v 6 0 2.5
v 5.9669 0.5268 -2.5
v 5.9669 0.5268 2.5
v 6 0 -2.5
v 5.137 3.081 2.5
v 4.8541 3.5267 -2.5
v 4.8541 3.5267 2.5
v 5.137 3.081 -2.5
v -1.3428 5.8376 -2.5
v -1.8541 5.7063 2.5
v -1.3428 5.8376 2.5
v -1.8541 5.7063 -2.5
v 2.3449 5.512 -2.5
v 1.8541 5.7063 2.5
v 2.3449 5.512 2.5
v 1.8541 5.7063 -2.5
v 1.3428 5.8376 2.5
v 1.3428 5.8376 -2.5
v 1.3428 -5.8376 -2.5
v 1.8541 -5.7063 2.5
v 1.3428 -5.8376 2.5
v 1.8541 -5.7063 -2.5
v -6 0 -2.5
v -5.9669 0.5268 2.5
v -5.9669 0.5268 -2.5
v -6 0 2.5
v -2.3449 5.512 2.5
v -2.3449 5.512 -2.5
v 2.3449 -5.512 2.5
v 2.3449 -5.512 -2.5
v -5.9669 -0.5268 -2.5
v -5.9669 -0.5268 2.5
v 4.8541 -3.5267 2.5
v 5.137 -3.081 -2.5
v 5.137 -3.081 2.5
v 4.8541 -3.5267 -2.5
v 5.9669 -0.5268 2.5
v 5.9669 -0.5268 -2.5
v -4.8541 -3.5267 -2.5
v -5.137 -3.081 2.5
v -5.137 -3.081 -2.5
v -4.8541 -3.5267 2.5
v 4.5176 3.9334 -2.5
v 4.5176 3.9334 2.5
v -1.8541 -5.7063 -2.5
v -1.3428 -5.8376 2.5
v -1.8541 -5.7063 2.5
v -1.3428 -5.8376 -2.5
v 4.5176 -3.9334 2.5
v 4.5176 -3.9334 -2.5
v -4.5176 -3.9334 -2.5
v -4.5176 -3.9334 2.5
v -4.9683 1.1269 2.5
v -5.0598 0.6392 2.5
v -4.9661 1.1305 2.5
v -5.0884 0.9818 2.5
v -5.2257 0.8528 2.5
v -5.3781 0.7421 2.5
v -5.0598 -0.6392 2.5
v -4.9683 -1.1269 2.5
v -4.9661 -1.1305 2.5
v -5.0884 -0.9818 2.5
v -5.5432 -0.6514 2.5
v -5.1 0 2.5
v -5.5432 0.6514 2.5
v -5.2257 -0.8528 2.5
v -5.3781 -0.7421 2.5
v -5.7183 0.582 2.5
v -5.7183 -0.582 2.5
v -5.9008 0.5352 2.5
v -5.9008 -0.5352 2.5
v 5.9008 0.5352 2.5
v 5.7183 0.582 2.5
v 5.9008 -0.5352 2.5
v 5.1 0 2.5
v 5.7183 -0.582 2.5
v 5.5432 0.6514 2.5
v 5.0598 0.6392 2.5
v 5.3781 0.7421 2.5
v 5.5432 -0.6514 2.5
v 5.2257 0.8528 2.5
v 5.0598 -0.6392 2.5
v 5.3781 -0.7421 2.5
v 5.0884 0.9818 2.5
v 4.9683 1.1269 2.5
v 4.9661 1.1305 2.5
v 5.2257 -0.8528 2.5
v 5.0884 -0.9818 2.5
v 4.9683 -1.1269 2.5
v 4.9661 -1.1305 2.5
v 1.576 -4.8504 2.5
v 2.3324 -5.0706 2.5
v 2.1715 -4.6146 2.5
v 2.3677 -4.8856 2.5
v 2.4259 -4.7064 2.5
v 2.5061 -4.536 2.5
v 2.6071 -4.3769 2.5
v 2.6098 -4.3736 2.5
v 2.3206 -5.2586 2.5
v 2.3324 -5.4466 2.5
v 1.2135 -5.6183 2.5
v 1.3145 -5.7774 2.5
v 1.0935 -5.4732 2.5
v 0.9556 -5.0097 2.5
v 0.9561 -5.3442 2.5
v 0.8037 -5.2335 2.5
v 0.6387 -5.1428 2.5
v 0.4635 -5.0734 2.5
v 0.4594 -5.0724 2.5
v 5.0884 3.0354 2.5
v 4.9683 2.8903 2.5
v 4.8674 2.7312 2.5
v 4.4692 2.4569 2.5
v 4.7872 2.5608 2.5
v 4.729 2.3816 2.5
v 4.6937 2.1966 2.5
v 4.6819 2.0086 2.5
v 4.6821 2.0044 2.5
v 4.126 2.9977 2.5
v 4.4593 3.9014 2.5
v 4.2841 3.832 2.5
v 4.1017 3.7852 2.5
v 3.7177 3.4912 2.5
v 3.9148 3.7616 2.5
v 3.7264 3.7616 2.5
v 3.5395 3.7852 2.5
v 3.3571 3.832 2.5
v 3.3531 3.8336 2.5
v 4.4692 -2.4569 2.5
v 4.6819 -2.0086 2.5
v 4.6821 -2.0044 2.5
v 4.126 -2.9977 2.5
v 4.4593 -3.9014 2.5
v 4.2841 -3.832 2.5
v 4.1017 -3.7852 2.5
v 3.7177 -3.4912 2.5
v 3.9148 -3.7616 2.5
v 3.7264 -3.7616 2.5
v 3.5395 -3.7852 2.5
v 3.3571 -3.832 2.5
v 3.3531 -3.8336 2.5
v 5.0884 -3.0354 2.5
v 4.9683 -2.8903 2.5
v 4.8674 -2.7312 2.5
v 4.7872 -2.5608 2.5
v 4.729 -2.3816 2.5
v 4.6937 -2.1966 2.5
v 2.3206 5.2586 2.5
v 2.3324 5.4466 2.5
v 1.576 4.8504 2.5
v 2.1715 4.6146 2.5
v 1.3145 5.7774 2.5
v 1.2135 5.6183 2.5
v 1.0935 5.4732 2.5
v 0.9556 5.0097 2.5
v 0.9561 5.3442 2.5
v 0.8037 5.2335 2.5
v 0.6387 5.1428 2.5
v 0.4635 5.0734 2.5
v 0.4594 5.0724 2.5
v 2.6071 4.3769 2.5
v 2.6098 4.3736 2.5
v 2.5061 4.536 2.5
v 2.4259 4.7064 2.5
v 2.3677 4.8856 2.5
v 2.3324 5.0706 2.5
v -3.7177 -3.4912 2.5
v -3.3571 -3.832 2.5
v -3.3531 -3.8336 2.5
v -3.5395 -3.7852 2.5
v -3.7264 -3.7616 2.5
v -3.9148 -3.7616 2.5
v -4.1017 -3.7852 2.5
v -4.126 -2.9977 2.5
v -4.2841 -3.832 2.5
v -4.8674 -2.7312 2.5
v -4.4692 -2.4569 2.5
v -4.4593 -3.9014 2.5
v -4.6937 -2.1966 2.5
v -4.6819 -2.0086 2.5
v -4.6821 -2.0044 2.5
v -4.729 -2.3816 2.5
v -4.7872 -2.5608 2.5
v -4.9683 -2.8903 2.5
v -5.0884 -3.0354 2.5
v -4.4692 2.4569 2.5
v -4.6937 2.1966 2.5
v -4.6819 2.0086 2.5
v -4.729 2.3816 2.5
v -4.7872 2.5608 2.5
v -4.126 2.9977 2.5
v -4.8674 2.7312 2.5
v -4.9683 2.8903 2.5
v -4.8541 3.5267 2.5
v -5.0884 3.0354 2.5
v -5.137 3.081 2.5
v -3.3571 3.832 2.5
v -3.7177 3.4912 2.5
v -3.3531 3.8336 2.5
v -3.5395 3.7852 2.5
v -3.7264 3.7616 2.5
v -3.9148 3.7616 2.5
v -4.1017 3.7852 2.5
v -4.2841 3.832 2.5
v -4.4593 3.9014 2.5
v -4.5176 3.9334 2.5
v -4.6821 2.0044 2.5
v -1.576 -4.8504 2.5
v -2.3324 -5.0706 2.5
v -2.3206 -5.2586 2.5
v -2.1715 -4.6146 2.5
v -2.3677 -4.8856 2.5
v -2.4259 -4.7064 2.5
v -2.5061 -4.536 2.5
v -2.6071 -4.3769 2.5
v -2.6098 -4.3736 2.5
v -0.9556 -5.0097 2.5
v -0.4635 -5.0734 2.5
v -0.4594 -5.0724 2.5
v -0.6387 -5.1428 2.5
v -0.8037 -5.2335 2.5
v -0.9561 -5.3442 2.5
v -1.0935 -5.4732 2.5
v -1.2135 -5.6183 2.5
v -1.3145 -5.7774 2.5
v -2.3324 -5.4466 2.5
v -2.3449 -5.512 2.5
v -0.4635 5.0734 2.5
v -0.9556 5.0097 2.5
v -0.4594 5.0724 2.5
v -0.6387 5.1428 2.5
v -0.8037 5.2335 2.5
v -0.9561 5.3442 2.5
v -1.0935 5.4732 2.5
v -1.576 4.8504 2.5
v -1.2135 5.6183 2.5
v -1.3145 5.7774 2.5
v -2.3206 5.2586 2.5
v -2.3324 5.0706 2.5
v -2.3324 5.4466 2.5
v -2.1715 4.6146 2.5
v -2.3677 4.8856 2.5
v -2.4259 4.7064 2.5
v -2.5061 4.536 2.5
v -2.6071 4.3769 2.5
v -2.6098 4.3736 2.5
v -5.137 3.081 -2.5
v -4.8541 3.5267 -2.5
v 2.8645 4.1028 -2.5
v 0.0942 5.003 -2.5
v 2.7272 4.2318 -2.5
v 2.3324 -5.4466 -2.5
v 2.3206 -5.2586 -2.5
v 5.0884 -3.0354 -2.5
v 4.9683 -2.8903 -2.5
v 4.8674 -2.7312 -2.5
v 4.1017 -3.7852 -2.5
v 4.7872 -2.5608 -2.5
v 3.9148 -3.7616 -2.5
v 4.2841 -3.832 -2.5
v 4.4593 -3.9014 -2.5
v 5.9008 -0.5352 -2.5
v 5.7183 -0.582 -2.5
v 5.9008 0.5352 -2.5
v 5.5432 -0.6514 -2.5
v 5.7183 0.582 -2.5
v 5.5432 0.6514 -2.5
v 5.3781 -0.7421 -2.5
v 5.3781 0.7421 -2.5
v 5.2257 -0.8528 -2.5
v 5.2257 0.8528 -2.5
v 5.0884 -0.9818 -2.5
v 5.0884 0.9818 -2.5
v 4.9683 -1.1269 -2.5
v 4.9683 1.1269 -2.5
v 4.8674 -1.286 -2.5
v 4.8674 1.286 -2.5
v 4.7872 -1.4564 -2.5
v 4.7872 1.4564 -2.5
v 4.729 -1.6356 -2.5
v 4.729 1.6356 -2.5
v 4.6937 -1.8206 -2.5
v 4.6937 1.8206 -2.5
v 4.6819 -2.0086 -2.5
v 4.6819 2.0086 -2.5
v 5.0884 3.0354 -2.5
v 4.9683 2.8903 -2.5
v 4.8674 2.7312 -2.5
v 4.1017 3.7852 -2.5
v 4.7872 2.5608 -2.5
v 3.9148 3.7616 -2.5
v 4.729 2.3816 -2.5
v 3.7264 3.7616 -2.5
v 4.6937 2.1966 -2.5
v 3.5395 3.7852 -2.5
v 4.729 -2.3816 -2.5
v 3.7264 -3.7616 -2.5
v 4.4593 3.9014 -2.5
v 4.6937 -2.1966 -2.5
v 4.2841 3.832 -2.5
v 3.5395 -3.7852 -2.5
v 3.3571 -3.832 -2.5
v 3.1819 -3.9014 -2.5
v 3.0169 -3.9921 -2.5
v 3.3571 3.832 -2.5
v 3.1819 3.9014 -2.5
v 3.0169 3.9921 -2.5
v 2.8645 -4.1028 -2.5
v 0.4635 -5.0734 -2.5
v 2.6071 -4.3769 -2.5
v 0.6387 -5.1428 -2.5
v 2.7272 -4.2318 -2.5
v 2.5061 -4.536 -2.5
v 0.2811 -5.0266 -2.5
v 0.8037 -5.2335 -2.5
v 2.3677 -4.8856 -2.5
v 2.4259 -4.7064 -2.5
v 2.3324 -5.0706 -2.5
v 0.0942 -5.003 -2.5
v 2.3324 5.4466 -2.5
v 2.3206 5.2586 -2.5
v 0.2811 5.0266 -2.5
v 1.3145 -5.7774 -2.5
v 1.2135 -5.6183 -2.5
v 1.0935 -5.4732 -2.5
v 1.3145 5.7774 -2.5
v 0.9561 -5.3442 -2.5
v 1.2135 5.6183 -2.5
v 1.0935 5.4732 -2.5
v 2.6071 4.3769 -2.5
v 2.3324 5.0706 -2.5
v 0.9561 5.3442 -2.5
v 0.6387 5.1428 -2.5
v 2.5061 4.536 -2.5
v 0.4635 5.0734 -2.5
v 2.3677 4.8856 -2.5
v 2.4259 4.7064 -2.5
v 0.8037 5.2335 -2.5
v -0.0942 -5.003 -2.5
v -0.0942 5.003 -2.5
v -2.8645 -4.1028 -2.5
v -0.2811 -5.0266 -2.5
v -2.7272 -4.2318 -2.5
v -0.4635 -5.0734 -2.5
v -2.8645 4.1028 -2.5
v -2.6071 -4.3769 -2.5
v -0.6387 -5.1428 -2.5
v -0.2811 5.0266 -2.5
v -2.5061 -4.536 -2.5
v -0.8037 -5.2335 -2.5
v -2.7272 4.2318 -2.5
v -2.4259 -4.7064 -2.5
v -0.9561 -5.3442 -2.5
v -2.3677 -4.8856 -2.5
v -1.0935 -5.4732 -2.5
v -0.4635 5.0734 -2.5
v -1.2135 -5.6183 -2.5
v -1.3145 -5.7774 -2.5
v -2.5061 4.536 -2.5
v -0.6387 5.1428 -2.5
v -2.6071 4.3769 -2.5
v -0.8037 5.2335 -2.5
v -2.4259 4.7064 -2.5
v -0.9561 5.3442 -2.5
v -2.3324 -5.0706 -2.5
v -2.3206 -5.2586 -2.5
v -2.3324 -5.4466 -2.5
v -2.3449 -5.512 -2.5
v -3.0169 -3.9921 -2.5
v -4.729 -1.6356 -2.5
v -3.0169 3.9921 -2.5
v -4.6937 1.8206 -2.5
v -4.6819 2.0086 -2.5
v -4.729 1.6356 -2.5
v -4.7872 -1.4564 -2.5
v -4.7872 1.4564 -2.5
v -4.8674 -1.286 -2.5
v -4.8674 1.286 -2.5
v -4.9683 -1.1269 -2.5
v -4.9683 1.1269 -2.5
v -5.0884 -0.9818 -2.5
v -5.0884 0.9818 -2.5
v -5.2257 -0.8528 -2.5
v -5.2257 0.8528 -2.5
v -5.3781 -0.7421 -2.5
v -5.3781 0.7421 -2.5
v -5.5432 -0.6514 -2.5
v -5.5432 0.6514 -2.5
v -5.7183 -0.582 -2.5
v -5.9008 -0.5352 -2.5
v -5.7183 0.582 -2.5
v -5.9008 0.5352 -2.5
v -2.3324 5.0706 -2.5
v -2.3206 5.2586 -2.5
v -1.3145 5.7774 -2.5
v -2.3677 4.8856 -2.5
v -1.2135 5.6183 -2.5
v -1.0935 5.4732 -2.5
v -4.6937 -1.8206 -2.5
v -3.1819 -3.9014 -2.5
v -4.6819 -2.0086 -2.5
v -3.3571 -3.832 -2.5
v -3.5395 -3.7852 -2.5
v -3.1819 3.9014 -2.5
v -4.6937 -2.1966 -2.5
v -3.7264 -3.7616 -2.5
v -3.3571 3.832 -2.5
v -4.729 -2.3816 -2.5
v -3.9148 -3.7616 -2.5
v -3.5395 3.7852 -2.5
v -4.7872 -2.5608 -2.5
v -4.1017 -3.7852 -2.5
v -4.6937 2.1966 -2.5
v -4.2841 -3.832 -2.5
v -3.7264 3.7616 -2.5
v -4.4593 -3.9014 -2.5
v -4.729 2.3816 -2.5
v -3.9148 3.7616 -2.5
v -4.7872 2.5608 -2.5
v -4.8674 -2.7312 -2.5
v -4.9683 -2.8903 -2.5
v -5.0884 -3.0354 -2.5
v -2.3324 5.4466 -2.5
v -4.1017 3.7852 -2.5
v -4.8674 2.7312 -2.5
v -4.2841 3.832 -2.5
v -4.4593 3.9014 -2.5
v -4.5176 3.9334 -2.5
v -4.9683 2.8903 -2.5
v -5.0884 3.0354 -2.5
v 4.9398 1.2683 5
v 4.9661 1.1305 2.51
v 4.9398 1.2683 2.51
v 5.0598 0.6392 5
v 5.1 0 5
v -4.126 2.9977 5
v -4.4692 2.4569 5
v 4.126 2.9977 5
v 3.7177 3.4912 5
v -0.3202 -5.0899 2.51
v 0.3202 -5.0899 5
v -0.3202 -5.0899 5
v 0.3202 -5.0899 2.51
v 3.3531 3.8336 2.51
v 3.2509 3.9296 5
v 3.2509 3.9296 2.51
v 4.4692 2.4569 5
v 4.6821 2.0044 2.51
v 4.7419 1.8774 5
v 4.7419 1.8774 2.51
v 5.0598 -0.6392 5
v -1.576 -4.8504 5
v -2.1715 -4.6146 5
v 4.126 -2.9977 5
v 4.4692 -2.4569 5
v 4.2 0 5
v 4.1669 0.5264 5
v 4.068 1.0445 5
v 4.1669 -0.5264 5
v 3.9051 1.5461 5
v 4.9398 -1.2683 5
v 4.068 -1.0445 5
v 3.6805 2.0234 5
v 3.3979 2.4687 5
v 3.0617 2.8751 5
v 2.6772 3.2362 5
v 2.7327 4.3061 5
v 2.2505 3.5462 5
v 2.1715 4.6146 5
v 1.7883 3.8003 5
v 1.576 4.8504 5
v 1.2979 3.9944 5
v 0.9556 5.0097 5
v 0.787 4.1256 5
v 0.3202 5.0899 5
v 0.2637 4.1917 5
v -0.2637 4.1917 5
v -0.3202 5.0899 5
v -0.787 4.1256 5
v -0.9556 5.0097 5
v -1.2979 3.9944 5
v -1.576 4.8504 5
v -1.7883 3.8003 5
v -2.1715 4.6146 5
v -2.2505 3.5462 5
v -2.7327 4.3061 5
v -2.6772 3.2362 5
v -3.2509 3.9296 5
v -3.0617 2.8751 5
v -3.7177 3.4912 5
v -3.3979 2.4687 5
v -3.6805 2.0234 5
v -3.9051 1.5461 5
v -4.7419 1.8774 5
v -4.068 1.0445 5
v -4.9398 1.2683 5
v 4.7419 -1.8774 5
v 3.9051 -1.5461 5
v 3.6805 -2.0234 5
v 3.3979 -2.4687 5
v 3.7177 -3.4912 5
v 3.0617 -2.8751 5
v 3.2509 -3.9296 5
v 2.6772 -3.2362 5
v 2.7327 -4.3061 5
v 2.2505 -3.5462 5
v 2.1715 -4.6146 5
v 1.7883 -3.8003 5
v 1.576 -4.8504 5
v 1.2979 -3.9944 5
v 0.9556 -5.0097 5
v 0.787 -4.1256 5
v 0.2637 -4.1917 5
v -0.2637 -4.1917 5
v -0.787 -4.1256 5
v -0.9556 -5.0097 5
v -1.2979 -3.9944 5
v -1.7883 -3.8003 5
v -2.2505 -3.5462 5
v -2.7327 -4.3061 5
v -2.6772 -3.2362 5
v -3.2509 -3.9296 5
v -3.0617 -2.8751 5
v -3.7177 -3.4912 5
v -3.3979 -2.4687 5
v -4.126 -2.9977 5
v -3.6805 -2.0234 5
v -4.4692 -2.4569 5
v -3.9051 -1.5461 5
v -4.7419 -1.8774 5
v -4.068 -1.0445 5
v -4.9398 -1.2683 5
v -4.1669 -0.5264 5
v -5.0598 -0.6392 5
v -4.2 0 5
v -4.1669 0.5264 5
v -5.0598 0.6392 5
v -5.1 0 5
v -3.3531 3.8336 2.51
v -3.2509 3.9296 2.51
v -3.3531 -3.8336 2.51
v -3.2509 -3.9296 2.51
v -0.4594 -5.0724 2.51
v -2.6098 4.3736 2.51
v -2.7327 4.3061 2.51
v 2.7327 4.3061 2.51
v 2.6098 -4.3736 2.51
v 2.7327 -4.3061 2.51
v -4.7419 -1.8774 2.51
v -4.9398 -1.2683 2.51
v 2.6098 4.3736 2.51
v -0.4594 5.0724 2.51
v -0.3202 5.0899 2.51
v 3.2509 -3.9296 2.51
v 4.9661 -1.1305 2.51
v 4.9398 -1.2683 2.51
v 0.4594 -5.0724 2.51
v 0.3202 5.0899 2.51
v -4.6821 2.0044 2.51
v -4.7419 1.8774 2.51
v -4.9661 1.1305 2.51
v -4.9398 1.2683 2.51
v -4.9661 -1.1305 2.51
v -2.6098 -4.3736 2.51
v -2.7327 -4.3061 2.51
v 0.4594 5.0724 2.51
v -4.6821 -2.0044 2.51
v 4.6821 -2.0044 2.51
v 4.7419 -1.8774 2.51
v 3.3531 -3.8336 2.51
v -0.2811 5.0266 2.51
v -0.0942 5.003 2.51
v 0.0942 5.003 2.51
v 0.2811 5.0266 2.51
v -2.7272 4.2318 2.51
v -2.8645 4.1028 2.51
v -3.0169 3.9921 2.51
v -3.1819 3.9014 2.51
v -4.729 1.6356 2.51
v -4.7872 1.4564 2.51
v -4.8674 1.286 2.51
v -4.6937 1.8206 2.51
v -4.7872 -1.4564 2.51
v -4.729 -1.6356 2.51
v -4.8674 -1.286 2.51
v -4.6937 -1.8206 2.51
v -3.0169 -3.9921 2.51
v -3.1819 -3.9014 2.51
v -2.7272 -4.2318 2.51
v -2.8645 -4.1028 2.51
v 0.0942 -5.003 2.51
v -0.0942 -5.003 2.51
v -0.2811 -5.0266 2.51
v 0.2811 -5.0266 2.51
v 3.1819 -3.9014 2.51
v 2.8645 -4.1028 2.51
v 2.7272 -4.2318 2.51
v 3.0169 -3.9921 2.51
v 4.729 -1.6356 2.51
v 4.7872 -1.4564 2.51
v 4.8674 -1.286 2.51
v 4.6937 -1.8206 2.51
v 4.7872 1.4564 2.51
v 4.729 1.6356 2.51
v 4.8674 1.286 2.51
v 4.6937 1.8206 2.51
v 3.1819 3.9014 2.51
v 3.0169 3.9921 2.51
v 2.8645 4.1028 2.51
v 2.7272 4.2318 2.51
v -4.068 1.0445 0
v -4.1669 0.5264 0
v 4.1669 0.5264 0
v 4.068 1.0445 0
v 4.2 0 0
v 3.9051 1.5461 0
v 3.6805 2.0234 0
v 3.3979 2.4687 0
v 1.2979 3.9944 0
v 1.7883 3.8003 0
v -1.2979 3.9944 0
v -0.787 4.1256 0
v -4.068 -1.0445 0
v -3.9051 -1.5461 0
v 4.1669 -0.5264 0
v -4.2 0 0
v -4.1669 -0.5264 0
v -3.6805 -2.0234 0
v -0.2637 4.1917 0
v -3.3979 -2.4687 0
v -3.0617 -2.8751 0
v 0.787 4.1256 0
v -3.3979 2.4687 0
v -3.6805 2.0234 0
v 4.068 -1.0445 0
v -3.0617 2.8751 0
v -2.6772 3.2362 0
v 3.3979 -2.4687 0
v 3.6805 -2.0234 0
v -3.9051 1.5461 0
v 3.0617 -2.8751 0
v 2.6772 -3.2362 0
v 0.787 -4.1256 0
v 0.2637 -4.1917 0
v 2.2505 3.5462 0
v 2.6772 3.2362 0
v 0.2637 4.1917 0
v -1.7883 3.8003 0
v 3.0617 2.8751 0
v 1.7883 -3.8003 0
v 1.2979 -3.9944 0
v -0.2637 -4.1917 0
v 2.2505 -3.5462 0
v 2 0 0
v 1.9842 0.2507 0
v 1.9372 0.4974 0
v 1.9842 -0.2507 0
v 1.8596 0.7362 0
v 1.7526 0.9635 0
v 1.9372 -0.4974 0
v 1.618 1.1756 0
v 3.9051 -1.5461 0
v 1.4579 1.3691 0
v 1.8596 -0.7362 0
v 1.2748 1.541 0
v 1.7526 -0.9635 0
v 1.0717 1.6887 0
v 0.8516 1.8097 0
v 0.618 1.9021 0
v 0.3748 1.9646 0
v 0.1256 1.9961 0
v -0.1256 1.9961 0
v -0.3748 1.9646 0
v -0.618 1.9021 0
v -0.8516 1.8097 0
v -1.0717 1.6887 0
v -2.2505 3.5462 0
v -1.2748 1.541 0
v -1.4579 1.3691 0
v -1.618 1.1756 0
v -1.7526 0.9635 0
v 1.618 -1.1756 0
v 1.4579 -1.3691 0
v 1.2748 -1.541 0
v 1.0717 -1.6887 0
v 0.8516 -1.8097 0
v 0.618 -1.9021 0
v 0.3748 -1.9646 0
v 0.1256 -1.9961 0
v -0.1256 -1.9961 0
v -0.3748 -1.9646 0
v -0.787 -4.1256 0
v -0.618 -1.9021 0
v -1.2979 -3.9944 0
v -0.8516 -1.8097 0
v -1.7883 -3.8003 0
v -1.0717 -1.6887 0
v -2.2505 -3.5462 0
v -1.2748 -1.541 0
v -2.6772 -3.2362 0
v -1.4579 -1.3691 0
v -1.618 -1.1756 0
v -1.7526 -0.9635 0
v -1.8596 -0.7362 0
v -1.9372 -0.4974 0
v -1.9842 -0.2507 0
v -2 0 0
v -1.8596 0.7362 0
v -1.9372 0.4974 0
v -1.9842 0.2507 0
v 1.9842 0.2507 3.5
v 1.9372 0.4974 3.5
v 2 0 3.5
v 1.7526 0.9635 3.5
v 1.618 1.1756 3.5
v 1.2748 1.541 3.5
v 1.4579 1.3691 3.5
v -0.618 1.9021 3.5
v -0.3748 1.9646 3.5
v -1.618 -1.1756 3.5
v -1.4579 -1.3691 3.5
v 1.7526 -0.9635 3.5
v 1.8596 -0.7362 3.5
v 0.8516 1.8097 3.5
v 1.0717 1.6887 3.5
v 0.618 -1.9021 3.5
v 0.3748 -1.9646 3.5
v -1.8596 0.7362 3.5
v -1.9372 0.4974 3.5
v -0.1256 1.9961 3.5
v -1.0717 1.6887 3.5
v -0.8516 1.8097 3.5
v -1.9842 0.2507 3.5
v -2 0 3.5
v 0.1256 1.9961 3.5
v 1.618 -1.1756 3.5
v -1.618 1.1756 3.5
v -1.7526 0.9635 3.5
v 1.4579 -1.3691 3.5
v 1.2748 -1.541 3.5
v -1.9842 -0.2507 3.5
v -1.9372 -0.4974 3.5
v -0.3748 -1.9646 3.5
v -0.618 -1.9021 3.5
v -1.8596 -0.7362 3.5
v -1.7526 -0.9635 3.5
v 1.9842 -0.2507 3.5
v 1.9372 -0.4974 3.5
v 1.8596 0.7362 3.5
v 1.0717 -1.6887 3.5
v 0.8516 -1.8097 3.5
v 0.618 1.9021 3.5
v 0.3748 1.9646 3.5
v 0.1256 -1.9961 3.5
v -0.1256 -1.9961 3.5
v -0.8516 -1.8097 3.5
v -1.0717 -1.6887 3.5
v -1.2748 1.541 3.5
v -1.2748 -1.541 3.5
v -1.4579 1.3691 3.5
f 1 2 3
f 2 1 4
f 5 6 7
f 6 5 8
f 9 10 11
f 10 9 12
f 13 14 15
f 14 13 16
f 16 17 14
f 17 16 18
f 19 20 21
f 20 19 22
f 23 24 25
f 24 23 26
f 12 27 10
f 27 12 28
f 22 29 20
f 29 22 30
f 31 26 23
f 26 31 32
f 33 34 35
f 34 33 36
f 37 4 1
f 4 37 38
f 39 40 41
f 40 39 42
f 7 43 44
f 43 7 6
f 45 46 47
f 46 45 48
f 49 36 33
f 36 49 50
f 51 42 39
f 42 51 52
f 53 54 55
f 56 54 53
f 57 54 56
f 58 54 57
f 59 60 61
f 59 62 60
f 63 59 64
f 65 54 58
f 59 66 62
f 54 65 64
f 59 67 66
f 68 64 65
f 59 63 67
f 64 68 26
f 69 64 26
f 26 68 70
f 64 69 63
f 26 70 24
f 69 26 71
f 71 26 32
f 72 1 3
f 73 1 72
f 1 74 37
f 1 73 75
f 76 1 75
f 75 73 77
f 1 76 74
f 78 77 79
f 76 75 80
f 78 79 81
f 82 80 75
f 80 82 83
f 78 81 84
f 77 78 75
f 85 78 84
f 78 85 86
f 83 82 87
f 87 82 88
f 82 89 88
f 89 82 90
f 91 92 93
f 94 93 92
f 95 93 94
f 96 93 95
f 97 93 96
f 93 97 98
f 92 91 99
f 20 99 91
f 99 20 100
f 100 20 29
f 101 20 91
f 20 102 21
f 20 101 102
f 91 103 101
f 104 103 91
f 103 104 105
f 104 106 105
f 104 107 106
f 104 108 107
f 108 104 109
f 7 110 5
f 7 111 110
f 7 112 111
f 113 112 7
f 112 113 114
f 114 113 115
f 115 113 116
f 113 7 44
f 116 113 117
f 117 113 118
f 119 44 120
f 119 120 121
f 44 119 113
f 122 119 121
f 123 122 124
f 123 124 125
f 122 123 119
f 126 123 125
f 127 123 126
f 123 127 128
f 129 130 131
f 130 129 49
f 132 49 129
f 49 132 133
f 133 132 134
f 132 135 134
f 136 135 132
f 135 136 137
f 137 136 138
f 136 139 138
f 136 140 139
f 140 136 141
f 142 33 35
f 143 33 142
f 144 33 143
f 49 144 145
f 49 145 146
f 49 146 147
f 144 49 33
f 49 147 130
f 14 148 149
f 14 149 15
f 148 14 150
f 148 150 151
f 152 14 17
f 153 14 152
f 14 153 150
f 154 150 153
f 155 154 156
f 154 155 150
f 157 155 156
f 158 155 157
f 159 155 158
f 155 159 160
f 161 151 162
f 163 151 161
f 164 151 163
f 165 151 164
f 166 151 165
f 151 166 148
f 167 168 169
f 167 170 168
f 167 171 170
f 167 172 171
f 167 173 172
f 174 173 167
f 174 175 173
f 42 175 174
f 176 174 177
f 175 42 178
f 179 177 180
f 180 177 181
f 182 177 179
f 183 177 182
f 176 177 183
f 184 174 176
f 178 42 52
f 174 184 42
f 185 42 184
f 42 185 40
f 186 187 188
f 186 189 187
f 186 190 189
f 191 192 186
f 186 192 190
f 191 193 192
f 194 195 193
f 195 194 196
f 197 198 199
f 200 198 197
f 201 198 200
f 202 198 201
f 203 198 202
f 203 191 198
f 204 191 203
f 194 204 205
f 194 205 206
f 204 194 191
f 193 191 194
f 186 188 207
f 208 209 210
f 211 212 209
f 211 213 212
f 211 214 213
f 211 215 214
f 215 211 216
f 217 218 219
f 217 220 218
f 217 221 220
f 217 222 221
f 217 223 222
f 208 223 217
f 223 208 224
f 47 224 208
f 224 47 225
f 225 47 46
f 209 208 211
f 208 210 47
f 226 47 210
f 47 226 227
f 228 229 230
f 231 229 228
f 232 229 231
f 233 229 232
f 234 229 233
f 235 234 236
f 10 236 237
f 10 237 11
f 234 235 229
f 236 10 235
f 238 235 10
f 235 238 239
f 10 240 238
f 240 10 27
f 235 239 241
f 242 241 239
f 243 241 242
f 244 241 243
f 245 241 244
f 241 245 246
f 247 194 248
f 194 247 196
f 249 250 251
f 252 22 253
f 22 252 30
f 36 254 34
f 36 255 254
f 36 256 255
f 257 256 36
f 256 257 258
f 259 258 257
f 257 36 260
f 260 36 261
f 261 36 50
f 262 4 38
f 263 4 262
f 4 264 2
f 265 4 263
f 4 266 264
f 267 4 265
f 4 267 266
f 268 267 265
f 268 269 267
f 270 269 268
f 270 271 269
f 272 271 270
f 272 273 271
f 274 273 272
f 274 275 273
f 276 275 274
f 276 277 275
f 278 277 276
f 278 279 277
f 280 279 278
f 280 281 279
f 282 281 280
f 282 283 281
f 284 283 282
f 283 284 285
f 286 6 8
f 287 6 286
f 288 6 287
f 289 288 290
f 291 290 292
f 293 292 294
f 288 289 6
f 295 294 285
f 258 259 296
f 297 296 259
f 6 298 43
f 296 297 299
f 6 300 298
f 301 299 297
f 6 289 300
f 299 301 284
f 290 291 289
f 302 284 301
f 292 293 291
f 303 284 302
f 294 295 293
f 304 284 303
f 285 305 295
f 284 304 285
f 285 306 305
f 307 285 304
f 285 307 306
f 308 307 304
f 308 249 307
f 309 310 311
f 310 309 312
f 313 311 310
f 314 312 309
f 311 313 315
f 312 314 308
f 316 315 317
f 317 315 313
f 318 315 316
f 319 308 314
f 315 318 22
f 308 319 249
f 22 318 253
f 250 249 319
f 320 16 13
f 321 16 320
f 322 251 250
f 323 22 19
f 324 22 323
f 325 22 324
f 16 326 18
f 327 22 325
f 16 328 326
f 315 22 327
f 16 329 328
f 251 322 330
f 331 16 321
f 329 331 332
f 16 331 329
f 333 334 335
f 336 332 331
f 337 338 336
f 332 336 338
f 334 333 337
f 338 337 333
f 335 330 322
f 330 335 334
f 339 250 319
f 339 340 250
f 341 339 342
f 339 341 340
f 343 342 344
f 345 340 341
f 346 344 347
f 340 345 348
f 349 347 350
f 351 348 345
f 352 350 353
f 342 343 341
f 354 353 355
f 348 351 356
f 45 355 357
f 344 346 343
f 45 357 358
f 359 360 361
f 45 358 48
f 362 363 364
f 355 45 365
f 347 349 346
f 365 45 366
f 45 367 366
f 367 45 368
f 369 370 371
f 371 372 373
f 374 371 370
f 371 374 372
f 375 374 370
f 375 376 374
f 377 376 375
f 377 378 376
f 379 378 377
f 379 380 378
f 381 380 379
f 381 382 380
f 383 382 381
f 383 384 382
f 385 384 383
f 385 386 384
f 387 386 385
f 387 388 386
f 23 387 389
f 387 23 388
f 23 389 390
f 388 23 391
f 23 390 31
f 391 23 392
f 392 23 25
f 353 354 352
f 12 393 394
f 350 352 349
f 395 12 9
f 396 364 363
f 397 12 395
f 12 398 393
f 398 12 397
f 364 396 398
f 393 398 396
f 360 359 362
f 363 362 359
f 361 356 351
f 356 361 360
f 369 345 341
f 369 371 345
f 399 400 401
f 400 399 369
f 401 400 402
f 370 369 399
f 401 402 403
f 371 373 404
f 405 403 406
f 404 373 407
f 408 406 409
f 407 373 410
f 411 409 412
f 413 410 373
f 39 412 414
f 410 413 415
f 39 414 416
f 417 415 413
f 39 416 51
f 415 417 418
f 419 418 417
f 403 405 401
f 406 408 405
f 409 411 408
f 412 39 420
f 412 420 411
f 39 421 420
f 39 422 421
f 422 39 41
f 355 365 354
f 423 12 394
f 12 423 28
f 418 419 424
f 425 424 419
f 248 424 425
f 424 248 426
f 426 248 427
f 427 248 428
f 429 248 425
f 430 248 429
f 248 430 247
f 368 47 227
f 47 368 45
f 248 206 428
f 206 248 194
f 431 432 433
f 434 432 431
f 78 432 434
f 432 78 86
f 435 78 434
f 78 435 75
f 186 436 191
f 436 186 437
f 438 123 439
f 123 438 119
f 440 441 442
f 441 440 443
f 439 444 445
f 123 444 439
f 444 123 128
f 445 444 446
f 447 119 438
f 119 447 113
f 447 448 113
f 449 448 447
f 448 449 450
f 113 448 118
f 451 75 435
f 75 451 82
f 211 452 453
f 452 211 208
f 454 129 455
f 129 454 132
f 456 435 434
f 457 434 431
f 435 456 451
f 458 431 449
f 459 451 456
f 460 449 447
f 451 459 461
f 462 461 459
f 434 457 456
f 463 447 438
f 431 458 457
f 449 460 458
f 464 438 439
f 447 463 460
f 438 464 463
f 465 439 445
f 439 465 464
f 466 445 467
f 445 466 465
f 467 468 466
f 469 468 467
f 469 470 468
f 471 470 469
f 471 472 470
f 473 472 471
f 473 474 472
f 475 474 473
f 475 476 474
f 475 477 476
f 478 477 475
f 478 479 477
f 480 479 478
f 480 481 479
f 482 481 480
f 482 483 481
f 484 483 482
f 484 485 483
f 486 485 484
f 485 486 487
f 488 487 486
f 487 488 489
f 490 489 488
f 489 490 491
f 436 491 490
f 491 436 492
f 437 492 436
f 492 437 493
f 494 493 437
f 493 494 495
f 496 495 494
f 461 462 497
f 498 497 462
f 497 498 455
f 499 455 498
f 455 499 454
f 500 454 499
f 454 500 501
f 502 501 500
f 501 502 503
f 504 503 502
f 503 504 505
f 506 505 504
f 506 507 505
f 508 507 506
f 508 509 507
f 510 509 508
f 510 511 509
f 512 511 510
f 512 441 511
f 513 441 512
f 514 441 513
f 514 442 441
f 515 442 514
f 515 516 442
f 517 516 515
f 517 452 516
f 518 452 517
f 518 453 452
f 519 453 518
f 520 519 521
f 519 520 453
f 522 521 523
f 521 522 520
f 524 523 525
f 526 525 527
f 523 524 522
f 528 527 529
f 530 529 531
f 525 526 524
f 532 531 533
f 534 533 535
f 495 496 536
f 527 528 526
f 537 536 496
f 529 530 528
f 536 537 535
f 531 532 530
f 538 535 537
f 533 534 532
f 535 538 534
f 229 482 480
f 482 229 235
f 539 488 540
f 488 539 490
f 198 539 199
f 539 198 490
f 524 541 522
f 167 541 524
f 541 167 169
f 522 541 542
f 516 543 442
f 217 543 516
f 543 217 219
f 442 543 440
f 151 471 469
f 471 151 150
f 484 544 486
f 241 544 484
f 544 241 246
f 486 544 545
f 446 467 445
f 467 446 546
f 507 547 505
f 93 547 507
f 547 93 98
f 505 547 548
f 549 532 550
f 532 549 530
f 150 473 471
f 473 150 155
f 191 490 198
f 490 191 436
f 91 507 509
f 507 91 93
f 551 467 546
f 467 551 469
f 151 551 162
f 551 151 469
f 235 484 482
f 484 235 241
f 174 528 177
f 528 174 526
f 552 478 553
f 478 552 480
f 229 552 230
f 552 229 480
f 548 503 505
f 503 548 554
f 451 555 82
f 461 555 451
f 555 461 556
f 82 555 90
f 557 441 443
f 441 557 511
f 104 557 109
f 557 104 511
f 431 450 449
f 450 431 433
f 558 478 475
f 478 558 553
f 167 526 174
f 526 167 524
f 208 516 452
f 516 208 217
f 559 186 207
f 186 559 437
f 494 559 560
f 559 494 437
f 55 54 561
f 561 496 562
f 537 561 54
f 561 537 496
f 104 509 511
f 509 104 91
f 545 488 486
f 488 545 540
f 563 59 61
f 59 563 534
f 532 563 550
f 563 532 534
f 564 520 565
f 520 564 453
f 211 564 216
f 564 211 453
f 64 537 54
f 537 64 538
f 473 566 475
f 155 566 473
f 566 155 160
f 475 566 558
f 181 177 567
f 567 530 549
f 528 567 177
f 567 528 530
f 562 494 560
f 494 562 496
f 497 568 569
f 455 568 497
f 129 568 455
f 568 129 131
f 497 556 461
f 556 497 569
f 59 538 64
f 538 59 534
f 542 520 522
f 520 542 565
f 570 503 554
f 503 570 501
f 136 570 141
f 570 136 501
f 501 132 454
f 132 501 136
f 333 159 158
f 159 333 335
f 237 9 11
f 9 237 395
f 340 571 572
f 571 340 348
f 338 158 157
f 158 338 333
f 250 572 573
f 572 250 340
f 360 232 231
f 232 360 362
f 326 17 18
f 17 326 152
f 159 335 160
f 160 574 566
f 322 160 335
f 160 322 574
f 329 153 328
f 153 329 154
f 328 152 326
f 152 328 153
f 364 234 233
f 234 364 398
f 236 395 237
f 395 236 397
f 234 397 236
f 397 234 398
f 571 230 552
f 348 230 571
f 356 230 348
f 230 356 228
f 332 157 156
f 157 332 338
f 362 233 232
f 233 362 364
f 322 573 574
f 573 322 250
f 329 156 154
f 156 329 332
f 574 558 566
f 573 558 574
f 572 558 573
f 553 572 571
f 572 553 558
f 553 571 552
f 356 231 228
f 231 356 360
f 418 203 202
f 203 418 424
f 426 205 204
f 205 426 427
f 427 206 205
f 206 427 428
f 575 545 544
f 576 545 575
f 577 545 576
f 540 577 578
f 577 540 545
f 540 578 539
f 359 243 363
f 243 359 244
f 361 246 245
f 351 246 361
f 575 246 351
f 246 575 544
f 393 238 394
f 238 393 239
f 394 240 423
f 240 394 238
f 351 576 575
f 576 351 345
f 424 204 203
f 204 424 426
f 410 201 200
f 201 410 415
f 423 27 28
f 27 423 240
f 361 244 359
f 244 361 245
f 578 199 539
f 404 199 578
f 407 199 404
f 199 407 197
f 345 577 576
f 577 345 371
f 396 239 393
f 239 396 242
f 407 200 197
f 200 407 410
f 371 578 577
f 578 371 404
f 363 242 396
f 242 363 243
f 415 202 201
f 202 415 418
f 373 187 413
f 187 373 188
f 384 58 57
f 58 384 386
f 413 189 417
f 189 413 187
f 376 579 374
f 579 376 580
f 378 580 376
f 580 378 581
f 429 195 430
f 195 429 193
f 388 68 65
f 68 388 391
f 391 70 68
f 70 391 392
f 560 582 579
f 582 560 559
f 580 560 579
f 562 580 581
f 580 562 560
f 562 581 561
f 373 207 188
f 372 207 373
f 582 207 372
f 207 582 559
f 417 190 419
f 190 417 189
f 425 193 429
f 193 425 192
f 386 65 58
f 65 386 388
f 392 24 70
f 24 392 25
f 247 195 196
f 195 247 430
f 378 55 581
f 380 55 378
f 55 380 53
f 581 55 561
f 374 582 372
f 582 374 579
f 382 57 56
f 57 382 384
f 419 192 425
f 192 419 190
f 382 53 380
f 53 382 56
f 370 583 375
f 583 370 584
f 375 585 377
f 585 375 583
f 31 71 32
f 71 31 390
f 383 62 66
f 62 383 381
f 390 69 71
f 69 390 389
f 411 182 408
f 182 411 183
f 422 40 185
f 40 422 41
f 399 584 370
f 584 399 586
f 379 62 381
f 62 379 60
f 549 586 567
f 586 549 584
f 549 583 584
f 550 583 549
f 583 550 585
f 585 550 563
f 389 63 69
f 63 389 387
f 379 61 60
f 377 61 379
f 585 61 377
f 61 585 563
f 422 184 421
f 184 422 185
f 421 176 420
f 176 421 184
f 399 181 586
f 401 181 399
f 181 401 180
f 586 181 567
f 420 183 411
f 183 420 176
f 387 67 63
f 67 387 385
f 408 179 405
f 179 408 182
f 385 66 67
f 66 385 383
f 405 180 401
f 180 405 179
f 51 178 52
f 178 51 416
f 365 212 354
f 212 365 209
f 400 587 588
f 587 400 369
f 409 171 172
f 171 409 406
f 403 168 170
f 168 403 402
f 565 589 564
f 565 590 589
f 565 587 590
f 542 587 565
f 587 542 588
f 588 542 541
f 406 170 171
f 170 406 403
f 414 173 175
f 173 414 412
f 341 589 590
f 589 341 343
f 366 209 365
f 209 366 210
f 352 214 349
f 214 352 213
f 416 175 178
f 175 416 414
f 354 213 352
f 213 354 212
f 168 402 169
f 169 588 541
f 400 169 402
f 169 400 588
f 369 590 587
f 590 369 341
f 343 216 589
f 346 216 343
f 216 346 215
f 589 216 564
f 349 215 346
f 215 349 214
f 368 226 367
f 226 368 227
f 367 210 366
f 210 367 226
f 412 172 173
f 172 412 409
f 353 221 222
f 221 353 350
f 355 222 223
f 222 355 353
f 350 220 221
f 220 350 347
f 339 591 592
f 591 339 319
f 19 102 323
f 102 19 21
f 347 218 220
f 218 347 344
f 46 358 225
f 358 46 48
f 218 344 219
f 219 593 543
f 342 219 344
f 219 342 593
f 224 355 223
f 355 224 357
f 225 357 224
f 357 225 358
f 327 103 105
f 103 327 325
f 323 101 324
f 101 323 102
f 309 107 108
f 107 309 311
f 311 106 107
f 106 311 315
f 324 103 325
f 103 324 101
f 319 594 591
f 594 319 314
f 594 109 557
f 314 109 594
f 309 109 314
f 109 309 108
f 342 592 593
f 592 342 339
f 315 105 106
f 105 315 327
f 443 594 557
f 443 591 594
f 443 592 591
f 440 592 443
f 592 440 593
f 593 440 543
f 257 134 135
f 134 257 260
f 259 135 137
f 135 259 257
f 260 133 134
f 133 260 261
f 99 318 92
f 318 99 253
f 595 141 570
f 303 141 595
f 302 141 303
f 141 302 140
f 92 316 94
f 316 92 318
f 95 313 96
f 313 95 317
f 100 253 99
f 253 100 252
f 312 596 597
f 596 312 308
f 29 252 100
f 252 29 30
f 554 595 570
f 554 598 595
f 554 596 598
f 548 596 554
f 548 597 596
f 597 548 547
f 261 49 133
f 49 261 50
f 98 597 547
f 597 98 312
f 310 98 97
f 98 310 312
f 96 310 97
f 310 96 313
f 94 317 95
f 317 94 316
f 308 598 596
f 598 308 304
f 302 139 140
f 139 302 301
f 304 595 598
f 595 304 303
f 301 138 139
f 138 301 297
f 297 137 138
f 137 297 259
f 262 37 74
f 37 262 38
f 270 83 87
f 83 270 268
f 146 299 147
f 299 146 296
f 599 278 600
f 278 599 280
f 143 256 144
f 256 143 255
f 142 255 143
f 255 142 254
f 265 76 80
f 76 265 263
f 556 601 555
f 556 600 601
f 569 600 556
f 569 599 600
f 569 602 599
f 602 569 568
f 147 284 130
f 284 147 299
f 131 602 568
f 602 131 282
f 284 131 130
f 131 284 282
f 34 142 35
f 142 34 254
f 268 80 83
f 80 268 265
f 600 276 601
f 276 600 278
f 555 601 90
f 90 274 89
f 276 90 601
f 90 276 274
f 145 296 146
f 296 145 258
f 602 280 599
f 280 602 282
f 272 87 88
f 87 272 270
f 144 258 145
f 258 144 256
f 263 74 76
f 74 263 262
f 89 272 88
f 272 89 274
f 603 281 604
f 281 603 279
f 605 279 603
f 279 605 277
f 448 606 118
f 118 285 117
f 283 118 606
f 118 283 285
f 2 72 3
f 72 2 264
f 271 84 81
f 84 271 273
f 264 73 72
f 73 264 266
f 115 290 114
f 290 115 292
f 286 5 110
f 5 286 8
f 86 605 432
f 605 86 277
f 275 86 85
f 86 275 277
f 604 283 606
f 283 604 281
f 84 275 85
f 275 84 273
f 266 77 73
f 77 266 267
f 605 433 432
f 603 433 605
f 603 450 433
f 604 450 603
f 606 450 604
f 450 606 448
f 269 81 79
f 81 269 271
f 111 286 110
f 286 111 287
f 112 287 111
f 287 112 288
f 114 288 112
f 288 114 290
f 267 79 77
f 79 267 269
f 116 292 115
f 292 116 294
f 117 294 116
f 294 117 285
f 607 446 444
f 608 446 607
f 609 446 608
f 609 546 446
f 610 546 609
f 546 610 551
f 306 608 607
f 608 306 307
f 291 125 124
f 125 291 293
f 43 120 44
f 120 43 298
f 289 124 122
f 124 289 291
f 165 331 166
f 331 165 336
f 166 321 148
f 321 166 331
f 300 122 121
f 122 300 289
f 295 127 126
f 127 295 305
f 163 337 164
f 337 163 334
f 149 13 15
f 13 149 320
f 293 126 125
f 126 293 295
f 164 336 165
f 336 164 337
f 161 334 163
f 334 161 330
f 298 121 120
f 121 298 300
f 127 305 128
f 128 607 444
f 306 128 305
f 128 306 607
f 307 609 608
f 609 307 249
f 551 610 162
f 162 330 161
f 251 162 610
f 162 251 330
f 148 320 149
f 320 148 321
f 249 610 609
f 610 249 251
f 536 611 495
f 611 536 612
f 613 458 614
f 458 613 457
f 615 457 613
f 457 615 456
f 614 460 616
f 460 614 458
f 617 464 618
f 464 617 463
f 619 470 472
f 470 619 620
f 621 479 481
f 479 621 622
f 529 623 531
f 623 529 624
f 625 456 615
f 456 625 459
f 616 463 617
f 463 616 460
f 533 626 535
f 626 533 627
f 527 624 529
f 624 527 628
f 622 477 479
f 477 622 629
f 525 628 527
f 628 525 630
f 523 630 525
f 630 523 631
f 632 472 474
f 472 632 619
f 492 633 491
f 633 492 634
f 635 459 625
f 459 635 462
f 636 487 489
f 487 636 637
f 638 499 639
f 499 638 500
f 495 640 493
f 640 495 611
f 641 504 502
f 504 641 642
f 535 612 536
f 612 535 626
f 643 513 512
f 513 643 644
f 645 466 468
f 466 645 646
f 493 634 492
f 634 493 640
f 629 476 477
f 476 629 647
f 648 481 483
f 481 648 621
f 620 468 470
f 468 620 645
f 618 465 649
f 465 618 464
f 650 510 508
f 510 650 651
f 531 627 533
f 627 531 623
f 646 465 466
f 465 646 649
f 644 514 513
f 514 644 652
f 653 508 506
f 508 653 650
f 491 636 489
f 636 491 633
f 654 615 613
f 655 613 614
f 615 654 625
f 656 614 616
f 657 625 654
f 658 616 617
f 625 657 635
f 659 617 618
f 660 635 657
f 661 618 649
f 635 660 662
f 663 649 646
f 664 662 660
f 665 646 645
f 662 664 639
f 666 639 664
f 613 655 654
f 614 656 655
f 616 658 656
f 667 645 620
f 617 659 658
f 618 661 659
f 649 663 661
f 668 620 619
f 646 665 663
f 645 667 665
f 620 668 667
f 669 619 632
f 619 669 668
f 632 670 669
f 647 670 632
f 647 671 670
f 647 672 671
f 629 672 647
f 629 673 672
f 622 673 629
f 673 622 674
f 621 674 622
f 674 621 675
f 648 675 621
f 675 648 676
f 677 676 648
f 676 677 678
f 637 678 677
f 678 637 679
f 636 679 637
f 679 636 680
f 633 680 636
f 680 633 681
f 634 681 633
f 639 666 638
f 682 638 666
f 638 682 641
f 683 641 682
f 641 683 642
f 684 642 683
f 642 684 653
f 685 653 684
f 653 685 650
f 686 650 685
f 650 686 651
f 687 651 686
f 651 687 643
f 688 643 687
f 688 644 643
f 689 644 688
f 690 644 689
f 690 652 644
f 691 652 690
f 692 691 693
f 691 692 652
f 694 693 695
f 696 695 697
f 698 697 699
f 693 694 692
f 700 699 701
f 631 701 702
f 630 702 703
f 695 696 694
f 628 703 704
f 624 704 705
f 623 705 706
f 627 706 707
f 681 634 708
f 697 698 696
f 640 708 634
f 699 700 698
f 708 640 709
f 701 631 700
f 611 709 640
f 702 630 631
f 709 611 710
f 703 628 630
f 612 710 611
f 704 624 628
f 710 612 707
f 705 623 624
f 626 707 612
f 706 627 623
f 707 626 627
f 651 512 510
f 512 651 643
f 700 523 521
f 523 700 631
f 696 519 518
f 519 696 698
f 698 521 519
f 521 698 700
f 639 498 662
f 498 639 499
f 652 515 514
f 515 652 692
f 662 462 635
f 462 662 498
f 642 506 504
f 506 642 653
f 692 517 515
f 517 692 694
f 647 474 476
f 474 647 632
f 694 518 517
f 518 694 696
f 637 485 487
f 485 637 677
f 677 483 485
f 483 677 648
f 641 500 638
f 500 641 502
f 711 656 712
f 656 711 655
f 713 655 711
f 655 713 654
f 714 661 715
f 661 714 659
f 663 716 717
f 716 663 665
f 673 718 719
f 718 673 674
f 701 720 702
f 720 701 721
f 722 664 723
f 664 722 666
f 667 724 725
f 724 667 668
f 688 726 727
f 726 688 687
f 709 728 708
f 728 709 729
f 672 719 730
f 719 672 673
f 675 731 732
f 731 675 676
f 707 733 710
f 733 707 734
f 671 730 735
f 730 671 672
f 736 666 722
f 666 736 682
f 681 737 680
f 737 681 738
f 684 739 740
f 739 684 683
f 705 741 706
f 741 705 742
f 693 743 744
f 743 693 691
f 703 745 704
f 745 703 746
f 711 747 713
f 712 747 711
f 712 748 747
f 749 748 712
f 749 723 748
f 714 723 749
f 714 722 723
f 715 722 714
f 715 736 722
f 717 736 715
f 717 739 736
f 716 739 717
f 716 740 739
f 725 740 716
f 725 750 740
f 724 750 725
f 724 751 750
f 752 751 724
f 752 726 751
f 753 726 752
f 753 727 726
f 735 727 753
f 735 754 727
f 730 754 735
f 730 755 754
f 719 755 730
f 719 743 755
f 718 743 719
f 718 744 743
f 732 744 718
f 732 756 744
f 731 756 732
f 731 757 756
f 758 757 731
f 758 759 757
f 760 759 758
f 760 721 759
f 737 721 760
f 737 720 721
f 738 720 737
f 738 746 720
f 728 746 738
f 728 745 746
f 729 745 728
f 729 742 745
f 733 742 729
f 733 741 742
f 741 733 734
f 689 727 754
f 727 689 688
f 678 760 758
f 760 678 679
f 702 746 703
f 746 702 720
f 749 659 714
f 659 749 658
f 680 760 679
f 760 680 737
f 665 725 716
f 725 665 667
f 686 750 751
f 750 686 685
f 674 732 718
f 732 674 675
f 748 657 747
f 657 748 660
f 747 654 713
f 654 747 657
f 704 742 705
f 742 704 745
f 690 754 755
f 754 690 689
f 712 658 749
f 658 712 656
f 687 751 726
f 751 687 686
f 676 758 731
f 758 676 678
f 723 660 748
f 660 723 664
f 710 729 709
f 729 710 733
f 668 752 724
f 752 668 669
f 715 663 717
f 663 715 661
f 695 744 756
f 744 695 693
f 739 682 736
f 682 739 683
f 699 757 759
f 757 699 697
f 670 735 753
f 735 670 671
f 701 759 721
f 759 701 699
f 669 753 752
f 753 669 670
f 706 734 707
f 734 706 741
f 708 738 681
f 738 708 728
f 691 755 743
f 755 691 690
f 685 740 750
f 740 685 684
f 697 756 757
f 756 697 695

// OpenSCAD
$fn=50;
union() 
{
	difference() 
	{
		union() 
		{
			cylinder(h = 5, r = 6, center=true);
			translate([0,0,2.5]) cylinder(h=5, r=5.1, center=true);
		}

		translate ([0,0,2.5]) cylinder(h=5, r=4.2, center=true);

		for ( i = [0:36:359] ) rotate ([0,0,i])
		{
			translate([0, 6.5, -2.5])
				#cylinder(h=5.01, r = 1.5);
		}
	}

	cylinder(h=3.5, r=2.0);
}
